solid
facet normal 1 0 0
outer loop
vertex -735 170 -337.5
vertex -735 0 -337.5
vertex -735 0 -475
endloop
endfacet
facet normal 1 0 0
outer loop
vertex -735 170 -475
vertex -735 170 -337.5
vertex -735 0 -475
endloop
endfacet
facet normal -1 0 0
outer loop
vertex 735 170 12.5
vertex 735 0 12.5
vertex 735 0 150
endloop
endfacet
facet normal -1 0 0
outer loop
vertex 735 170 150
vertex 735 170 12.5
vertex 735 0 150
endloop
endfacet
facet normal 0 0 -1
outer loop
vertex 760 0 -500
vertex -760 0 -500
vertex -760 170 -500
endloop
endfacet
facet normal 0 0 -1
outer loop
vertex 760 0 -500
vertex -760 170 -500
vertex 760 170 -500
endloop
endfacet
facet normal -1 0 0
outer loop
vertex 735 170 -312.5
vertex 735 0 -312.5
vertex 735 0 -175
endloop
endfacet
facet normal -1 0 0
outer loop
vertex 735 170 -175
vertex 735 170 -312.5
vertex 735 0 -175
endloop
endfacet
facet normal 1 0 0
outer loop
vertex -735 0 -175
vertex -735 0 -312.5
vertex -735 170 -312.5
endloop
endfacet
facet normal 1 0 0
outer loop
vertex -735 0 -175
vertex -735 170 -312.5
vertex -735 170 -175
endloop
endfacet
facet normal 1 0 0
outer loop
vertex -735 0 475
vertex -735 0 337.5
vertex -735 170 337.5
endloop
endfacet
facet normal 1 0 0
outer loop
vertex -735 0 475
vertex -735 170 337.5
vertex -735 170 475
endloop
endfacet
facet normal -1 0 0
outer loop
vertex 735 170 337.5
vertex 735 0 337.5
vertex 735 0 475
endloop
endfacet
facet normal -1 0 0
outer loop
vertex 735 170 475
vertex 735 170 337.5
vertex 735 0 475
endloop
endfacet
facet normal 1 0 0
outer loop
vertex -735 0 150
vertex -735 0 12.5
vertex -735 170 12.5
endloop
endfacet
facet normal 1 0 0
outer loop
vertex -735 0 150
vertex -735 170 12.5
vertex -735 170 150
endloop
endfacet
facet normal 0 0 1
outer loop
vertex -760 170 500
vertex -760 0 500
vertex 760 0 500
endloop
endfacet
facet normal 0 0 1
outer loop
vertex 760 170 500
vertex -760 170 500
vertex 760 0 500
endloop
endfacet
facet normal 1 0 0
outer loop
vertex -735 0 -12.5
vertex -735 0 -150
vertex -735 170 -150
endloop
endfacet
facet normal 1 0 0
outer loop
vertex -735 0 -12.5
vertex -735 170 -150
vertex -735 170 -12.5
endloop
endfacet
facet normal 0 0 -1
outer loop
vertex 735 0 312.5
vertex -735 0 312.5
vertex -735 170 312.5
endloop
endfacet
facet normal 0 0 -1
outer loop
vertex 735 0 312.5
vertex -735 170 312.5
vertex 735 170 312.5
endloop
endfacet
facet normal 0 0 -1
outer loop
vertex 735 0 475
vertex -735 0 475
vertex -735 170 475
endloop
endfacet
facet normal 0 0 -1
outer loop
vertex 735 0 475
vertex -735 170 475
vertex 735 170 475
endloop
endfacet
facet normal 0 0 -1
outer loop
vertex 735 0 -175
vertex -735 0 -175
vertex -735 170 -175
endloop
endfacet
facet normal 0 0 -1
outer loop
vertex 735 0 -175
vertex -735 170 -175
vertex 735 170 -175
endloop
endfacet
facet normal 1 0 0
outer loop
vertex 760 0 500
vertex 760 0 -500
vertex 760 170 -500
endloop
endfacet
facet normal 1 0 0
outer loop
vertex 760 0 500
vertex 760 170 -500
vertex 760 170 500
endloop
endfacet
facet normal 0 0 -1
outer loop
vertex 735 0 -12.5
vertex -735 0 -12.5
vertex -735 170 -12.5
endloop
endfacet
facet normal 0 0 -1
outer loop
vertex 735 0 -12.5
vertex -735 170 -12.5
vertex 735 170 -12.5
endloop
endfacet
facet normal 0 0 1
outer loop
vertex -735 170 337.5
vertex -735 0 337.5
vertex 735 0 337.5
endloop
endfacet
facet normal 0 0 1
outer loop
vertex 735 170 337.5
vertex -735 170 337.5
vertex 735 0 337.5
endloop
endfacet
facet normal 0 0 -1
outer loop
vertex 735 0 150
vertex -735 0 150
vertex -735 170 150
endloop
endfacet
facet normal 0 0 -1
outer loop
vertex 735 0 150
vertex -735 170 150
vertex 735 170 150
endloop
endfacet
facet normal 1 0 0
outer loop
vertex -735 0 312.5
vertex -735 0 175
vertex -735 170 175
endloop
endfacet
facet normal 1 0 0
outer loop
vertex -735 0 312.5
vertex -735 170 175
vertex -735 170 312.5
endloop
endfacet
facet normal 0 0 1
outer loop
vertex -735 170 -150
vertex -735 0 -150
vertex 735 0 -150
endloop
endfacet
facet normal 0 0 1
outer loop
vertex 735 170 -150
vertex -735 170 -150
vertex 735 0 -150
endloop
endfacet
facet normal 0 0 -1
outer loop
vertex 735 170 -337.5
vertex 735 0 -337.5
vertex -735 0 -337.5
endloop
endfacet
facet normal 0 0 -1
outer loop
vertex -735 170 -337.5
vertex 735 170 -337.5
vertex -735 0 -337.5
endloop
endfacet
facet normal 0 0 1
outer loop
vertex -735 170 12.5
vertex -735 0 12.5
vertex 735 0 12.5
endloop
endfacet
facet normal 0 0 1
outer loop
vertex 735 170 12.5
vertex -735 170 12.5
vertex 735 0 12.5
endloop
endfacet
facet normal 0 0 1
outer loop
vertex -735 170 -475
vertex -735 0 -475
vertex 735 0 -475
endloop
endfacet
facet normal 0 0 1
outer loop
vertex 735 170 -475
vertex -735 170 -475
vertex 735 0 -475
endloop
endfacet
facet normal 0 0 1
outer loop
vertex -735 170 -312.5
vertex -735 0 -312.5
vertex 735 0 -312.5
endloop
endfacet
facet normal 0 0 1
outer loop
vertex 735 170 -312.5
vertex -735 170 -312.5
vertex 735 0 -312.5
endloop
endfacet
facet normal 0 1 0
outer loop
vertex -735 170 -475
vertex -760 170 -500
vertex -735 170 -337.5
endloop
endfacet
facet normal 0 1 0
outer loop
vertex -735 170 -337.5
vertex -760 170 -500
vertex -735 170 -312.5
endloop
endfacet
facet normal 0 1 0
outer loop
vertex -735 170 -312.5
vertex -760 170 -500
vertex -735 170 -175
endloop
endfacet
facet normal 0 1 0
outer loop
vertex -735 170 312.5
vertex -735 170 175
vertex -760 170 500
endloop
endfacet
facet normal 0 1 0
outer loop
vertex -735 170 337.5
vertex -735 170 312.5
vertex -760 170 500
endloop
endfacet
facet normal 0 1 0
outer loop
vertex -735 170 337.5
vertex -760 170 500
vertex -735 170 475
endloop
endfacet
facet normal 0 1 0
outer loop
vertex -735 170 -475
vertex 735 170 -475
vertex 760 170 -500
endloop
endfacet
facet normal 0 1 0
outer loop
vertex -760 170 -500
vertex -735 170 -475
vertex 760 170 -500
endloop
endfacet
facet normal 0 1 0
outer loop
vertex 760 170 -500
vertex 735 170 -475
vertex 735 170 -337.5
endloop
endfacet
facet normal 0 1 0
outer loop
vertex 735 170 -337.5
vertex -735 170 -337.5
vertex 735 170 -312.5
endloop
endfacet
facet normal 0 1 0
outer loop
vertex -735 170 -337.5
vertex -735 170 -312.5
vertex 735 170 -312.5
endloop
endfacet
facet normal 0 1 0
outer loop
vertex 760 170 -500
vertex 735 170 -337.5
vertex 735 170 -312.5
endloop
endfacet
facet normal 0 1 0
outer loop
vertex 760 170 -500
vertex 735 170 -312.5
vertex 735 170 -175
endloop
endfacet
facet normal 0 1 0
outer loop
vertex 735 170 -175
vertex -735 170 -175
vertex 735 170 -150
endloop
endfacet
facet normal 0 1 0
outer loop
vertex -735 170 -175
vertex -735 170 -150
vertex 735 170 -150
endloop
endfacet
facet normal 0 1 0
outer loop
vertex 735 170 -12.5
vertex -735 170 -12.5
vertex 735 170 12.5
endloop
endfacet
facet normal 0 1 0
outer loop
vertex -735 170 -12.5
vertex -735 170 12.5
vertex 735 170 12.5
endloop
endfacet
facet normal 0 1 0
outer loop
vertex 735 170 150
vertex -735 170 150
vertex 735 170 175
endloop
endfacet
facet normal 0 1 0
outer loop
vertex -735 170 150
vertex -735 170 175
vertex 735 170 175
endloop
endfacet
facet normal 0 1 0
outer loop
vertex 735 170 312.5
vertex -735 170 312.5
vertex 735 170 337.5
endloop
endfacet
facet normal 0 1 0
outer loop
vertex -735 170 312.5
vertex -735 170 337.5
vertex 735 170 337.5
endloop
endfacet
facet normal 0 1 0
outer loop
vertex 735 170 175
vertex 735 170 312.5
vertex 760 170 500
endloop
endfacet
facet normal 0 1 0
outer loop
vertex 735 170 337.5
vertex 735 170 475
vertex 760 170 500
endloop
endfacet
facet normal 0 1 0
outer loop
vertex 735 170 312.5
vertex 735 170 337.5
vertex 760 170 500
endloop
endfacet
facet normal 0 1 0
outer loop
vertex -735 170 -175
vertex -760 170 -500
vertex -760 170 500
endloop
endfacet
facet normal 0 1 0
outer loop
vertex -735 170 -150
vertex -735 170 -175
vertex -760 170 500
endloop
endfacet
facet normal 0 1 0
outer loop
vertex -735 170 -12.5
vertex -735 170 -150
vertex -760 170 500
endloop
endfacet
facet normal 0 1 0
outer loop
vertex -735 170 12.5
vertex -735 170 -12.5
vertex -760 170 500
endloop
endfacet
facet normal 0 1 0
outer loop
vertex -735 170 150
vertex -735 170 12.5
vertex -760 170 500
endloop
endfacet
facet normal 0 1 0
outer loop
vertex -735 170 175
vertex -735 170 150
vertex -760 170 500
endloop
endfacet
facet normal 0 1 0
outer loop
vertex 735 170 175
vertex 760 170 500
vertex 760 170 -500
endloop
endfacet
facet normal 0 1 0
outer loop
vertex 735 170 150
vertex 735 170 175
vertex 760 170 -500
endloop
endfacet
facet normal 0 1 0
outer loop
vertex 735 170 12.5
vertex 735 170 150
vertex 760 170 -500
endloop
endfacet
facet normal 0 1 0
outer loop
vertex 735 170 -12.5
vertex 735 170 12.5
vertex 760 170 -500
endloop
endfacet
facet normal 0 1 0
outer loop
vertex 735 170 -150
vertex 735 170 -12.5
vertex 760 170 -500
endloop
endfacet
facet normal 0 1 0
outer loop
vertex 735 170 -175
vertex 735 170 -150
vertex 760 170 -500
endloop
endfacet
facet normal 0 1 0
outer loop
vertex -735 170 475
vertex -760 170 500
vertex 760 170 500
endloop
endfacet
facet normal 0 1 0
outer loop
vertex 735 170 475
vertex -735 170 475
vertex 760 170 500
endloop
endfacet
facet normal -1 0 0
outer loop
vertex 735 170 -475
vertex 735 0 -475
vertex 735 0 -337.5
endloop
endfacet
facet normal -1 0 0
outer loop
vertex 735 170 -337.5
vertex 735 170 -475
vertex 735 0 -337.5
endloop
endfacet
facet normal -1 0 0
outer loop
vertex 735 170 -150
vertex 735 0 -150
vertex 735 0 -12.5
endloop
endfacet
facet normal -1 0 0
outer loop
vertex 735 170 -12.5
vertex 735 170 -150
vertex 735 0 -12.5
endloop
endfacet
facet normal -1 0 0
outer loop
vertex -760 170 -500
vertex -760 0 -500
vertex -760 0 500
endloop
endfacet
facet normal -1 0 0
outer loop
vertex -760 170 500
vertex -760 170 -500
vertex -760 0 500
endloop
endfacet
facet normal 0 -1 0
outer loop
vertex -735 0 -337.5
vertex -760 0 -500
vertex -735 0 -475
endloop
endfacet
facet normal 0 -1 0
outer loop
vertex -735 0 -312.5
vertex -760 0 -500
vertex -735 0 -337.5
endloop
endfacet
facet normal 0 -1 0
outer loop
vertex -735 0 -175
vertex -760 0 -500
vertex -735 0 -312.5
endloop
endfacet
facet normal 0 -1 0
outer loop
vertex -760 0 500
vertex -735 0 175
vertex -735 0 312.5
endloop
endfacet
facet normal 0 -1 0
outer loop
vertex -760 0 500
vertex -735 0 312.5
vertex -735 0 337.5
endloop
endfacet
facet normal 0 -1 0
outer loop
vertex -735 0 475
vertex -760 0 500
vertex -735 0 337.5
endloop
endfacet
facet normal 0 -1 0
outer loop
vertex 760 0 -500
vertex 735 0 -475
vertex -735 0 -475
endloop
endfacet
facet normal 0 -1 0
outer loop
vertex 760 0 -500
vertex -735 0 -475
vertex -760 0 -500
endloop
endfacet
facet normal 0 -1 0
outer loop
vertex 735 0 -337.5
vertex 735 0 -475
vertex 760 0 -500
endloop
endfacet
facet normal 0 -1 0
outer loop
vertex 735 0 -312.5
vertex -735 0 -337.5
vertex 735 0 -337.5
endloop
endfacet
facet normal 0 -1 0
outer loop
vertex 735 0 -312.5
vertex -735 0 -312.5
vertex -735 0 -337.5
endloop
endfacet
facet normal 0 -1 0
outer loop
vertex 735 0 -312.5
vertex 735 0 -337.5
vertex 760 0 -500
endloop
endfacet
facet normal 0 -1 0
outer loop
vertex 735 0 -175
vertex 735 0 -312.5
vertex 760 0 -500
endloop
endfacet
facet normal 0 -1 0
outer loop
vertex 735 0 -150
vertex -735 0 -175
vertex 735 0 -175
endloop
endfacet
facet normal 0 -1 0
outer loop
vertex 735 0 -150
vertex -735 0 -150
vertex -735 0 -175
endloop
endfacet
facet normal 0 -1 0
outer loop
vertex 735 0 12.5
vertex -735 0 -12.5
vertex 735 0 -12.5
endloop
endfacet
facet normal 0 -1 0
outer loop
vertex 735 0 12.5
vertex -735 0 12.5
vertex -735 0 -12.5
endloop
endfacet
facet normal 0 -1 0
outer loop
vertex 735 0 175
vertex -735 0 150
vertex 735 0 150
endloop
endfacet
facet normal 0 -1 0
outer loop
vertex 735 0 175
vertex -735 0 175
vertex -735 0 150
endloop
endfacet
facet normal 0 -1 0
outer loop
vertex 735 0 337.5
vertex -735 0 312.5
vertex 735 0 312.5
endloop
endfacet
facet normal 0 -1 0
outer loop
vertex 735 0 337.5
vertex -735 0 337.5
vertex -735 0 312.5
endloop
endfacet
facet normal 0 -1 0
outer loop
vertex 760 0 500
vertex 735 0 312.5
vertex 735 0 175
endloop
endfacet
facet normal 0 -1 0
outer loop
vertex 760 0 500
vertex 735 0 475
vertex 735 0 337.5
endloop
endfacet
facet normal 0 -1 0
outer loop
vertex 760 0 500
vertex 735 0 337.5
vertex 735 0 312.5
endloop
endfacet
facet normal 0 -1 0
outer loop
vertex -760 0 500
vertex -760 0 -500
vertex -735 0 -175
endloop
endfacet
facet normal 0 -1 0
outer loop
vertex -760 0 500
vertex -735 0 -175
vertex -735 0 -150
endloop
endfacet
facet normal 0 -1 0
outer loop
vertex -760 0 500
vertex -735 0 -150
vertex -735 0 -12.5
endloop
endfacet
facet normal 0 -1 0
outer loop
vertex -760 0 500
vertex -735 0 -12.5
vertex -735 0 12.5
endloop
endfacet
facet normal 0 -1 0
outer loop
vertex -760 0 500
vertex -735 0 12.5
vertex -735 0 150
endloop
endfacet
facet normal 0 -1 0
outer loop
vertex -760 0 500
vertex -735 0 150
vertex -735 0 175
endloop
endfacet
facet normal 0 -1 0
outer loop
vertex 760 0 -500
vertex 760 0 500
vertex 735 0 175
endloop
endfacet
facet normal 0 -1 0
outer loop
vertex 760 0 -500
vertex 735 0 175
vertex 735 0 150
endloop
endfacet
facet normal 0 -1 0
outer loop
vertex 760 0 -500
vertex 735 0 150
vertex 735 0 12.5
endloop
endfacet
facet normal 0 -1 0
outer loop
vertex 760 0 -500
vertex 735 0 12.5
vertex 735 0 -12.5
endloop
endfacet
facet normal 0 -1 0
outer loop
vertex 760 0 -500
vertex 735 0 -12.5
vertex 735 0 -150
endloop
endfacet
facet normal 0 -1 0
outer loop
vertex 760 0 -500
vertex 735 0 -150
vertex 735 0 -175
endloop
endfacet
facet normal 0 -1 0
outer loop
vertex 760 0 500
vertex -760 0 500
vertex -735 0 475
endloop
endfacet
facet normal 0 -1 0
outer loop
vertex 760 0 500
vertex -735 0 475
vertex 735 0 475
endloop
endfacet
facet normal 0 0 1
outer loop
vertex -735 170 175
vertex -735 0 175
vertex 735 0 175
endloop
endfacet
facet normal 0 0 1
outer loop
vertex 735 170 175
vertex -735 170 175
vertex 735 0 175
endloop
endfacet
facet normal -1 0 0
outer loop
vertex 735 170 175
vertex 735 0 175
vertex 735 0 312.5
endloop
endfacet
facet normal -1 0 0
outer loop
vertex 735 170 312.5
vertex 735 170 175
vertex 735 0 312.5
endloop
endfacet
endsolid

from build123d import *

# Parameters (mm, degrees)
F0_W     = 1520
F0_H     = 1000
F1_DEPTH = 170
F2_W     = 1470
F2_H     = 137.5
F3_DEPTH = 170


with BuildPart() as f1:
    # F0 (on Front) → F1 (new body)
    with BuildSketch(Plane.XZ):
        Rectangle(F0_W, F0_H)
    extrude(amount=-F1_DEPTH)

    # F2 (on face) → F3 (cut, through all)
    with BuildSketch(Plane.XZ):
        with Locations((0, 406.25)):
            Rectangle(F2_W, F2_H)
        with Locations((0, 243.75)):
            Rectangle(F2_W, F2_H)
        with Locations((0, 81.25)):
            Rectangle(F2_W, F2_H)
        with Locations((0, -81.25)):
            Rectangle(F2_W, F2_H)
        with Locations((0, -243.75)):
            Rectangle(F2_W, F2_H)
        Polygon((-735, -337.5), (-735, -475), (735, -475), (735, -425), (735, -337.5), align=None)
    extrude(amount=-F3_DEPTH, mode=Mode.SUBTRACT)


solid = f1.part
